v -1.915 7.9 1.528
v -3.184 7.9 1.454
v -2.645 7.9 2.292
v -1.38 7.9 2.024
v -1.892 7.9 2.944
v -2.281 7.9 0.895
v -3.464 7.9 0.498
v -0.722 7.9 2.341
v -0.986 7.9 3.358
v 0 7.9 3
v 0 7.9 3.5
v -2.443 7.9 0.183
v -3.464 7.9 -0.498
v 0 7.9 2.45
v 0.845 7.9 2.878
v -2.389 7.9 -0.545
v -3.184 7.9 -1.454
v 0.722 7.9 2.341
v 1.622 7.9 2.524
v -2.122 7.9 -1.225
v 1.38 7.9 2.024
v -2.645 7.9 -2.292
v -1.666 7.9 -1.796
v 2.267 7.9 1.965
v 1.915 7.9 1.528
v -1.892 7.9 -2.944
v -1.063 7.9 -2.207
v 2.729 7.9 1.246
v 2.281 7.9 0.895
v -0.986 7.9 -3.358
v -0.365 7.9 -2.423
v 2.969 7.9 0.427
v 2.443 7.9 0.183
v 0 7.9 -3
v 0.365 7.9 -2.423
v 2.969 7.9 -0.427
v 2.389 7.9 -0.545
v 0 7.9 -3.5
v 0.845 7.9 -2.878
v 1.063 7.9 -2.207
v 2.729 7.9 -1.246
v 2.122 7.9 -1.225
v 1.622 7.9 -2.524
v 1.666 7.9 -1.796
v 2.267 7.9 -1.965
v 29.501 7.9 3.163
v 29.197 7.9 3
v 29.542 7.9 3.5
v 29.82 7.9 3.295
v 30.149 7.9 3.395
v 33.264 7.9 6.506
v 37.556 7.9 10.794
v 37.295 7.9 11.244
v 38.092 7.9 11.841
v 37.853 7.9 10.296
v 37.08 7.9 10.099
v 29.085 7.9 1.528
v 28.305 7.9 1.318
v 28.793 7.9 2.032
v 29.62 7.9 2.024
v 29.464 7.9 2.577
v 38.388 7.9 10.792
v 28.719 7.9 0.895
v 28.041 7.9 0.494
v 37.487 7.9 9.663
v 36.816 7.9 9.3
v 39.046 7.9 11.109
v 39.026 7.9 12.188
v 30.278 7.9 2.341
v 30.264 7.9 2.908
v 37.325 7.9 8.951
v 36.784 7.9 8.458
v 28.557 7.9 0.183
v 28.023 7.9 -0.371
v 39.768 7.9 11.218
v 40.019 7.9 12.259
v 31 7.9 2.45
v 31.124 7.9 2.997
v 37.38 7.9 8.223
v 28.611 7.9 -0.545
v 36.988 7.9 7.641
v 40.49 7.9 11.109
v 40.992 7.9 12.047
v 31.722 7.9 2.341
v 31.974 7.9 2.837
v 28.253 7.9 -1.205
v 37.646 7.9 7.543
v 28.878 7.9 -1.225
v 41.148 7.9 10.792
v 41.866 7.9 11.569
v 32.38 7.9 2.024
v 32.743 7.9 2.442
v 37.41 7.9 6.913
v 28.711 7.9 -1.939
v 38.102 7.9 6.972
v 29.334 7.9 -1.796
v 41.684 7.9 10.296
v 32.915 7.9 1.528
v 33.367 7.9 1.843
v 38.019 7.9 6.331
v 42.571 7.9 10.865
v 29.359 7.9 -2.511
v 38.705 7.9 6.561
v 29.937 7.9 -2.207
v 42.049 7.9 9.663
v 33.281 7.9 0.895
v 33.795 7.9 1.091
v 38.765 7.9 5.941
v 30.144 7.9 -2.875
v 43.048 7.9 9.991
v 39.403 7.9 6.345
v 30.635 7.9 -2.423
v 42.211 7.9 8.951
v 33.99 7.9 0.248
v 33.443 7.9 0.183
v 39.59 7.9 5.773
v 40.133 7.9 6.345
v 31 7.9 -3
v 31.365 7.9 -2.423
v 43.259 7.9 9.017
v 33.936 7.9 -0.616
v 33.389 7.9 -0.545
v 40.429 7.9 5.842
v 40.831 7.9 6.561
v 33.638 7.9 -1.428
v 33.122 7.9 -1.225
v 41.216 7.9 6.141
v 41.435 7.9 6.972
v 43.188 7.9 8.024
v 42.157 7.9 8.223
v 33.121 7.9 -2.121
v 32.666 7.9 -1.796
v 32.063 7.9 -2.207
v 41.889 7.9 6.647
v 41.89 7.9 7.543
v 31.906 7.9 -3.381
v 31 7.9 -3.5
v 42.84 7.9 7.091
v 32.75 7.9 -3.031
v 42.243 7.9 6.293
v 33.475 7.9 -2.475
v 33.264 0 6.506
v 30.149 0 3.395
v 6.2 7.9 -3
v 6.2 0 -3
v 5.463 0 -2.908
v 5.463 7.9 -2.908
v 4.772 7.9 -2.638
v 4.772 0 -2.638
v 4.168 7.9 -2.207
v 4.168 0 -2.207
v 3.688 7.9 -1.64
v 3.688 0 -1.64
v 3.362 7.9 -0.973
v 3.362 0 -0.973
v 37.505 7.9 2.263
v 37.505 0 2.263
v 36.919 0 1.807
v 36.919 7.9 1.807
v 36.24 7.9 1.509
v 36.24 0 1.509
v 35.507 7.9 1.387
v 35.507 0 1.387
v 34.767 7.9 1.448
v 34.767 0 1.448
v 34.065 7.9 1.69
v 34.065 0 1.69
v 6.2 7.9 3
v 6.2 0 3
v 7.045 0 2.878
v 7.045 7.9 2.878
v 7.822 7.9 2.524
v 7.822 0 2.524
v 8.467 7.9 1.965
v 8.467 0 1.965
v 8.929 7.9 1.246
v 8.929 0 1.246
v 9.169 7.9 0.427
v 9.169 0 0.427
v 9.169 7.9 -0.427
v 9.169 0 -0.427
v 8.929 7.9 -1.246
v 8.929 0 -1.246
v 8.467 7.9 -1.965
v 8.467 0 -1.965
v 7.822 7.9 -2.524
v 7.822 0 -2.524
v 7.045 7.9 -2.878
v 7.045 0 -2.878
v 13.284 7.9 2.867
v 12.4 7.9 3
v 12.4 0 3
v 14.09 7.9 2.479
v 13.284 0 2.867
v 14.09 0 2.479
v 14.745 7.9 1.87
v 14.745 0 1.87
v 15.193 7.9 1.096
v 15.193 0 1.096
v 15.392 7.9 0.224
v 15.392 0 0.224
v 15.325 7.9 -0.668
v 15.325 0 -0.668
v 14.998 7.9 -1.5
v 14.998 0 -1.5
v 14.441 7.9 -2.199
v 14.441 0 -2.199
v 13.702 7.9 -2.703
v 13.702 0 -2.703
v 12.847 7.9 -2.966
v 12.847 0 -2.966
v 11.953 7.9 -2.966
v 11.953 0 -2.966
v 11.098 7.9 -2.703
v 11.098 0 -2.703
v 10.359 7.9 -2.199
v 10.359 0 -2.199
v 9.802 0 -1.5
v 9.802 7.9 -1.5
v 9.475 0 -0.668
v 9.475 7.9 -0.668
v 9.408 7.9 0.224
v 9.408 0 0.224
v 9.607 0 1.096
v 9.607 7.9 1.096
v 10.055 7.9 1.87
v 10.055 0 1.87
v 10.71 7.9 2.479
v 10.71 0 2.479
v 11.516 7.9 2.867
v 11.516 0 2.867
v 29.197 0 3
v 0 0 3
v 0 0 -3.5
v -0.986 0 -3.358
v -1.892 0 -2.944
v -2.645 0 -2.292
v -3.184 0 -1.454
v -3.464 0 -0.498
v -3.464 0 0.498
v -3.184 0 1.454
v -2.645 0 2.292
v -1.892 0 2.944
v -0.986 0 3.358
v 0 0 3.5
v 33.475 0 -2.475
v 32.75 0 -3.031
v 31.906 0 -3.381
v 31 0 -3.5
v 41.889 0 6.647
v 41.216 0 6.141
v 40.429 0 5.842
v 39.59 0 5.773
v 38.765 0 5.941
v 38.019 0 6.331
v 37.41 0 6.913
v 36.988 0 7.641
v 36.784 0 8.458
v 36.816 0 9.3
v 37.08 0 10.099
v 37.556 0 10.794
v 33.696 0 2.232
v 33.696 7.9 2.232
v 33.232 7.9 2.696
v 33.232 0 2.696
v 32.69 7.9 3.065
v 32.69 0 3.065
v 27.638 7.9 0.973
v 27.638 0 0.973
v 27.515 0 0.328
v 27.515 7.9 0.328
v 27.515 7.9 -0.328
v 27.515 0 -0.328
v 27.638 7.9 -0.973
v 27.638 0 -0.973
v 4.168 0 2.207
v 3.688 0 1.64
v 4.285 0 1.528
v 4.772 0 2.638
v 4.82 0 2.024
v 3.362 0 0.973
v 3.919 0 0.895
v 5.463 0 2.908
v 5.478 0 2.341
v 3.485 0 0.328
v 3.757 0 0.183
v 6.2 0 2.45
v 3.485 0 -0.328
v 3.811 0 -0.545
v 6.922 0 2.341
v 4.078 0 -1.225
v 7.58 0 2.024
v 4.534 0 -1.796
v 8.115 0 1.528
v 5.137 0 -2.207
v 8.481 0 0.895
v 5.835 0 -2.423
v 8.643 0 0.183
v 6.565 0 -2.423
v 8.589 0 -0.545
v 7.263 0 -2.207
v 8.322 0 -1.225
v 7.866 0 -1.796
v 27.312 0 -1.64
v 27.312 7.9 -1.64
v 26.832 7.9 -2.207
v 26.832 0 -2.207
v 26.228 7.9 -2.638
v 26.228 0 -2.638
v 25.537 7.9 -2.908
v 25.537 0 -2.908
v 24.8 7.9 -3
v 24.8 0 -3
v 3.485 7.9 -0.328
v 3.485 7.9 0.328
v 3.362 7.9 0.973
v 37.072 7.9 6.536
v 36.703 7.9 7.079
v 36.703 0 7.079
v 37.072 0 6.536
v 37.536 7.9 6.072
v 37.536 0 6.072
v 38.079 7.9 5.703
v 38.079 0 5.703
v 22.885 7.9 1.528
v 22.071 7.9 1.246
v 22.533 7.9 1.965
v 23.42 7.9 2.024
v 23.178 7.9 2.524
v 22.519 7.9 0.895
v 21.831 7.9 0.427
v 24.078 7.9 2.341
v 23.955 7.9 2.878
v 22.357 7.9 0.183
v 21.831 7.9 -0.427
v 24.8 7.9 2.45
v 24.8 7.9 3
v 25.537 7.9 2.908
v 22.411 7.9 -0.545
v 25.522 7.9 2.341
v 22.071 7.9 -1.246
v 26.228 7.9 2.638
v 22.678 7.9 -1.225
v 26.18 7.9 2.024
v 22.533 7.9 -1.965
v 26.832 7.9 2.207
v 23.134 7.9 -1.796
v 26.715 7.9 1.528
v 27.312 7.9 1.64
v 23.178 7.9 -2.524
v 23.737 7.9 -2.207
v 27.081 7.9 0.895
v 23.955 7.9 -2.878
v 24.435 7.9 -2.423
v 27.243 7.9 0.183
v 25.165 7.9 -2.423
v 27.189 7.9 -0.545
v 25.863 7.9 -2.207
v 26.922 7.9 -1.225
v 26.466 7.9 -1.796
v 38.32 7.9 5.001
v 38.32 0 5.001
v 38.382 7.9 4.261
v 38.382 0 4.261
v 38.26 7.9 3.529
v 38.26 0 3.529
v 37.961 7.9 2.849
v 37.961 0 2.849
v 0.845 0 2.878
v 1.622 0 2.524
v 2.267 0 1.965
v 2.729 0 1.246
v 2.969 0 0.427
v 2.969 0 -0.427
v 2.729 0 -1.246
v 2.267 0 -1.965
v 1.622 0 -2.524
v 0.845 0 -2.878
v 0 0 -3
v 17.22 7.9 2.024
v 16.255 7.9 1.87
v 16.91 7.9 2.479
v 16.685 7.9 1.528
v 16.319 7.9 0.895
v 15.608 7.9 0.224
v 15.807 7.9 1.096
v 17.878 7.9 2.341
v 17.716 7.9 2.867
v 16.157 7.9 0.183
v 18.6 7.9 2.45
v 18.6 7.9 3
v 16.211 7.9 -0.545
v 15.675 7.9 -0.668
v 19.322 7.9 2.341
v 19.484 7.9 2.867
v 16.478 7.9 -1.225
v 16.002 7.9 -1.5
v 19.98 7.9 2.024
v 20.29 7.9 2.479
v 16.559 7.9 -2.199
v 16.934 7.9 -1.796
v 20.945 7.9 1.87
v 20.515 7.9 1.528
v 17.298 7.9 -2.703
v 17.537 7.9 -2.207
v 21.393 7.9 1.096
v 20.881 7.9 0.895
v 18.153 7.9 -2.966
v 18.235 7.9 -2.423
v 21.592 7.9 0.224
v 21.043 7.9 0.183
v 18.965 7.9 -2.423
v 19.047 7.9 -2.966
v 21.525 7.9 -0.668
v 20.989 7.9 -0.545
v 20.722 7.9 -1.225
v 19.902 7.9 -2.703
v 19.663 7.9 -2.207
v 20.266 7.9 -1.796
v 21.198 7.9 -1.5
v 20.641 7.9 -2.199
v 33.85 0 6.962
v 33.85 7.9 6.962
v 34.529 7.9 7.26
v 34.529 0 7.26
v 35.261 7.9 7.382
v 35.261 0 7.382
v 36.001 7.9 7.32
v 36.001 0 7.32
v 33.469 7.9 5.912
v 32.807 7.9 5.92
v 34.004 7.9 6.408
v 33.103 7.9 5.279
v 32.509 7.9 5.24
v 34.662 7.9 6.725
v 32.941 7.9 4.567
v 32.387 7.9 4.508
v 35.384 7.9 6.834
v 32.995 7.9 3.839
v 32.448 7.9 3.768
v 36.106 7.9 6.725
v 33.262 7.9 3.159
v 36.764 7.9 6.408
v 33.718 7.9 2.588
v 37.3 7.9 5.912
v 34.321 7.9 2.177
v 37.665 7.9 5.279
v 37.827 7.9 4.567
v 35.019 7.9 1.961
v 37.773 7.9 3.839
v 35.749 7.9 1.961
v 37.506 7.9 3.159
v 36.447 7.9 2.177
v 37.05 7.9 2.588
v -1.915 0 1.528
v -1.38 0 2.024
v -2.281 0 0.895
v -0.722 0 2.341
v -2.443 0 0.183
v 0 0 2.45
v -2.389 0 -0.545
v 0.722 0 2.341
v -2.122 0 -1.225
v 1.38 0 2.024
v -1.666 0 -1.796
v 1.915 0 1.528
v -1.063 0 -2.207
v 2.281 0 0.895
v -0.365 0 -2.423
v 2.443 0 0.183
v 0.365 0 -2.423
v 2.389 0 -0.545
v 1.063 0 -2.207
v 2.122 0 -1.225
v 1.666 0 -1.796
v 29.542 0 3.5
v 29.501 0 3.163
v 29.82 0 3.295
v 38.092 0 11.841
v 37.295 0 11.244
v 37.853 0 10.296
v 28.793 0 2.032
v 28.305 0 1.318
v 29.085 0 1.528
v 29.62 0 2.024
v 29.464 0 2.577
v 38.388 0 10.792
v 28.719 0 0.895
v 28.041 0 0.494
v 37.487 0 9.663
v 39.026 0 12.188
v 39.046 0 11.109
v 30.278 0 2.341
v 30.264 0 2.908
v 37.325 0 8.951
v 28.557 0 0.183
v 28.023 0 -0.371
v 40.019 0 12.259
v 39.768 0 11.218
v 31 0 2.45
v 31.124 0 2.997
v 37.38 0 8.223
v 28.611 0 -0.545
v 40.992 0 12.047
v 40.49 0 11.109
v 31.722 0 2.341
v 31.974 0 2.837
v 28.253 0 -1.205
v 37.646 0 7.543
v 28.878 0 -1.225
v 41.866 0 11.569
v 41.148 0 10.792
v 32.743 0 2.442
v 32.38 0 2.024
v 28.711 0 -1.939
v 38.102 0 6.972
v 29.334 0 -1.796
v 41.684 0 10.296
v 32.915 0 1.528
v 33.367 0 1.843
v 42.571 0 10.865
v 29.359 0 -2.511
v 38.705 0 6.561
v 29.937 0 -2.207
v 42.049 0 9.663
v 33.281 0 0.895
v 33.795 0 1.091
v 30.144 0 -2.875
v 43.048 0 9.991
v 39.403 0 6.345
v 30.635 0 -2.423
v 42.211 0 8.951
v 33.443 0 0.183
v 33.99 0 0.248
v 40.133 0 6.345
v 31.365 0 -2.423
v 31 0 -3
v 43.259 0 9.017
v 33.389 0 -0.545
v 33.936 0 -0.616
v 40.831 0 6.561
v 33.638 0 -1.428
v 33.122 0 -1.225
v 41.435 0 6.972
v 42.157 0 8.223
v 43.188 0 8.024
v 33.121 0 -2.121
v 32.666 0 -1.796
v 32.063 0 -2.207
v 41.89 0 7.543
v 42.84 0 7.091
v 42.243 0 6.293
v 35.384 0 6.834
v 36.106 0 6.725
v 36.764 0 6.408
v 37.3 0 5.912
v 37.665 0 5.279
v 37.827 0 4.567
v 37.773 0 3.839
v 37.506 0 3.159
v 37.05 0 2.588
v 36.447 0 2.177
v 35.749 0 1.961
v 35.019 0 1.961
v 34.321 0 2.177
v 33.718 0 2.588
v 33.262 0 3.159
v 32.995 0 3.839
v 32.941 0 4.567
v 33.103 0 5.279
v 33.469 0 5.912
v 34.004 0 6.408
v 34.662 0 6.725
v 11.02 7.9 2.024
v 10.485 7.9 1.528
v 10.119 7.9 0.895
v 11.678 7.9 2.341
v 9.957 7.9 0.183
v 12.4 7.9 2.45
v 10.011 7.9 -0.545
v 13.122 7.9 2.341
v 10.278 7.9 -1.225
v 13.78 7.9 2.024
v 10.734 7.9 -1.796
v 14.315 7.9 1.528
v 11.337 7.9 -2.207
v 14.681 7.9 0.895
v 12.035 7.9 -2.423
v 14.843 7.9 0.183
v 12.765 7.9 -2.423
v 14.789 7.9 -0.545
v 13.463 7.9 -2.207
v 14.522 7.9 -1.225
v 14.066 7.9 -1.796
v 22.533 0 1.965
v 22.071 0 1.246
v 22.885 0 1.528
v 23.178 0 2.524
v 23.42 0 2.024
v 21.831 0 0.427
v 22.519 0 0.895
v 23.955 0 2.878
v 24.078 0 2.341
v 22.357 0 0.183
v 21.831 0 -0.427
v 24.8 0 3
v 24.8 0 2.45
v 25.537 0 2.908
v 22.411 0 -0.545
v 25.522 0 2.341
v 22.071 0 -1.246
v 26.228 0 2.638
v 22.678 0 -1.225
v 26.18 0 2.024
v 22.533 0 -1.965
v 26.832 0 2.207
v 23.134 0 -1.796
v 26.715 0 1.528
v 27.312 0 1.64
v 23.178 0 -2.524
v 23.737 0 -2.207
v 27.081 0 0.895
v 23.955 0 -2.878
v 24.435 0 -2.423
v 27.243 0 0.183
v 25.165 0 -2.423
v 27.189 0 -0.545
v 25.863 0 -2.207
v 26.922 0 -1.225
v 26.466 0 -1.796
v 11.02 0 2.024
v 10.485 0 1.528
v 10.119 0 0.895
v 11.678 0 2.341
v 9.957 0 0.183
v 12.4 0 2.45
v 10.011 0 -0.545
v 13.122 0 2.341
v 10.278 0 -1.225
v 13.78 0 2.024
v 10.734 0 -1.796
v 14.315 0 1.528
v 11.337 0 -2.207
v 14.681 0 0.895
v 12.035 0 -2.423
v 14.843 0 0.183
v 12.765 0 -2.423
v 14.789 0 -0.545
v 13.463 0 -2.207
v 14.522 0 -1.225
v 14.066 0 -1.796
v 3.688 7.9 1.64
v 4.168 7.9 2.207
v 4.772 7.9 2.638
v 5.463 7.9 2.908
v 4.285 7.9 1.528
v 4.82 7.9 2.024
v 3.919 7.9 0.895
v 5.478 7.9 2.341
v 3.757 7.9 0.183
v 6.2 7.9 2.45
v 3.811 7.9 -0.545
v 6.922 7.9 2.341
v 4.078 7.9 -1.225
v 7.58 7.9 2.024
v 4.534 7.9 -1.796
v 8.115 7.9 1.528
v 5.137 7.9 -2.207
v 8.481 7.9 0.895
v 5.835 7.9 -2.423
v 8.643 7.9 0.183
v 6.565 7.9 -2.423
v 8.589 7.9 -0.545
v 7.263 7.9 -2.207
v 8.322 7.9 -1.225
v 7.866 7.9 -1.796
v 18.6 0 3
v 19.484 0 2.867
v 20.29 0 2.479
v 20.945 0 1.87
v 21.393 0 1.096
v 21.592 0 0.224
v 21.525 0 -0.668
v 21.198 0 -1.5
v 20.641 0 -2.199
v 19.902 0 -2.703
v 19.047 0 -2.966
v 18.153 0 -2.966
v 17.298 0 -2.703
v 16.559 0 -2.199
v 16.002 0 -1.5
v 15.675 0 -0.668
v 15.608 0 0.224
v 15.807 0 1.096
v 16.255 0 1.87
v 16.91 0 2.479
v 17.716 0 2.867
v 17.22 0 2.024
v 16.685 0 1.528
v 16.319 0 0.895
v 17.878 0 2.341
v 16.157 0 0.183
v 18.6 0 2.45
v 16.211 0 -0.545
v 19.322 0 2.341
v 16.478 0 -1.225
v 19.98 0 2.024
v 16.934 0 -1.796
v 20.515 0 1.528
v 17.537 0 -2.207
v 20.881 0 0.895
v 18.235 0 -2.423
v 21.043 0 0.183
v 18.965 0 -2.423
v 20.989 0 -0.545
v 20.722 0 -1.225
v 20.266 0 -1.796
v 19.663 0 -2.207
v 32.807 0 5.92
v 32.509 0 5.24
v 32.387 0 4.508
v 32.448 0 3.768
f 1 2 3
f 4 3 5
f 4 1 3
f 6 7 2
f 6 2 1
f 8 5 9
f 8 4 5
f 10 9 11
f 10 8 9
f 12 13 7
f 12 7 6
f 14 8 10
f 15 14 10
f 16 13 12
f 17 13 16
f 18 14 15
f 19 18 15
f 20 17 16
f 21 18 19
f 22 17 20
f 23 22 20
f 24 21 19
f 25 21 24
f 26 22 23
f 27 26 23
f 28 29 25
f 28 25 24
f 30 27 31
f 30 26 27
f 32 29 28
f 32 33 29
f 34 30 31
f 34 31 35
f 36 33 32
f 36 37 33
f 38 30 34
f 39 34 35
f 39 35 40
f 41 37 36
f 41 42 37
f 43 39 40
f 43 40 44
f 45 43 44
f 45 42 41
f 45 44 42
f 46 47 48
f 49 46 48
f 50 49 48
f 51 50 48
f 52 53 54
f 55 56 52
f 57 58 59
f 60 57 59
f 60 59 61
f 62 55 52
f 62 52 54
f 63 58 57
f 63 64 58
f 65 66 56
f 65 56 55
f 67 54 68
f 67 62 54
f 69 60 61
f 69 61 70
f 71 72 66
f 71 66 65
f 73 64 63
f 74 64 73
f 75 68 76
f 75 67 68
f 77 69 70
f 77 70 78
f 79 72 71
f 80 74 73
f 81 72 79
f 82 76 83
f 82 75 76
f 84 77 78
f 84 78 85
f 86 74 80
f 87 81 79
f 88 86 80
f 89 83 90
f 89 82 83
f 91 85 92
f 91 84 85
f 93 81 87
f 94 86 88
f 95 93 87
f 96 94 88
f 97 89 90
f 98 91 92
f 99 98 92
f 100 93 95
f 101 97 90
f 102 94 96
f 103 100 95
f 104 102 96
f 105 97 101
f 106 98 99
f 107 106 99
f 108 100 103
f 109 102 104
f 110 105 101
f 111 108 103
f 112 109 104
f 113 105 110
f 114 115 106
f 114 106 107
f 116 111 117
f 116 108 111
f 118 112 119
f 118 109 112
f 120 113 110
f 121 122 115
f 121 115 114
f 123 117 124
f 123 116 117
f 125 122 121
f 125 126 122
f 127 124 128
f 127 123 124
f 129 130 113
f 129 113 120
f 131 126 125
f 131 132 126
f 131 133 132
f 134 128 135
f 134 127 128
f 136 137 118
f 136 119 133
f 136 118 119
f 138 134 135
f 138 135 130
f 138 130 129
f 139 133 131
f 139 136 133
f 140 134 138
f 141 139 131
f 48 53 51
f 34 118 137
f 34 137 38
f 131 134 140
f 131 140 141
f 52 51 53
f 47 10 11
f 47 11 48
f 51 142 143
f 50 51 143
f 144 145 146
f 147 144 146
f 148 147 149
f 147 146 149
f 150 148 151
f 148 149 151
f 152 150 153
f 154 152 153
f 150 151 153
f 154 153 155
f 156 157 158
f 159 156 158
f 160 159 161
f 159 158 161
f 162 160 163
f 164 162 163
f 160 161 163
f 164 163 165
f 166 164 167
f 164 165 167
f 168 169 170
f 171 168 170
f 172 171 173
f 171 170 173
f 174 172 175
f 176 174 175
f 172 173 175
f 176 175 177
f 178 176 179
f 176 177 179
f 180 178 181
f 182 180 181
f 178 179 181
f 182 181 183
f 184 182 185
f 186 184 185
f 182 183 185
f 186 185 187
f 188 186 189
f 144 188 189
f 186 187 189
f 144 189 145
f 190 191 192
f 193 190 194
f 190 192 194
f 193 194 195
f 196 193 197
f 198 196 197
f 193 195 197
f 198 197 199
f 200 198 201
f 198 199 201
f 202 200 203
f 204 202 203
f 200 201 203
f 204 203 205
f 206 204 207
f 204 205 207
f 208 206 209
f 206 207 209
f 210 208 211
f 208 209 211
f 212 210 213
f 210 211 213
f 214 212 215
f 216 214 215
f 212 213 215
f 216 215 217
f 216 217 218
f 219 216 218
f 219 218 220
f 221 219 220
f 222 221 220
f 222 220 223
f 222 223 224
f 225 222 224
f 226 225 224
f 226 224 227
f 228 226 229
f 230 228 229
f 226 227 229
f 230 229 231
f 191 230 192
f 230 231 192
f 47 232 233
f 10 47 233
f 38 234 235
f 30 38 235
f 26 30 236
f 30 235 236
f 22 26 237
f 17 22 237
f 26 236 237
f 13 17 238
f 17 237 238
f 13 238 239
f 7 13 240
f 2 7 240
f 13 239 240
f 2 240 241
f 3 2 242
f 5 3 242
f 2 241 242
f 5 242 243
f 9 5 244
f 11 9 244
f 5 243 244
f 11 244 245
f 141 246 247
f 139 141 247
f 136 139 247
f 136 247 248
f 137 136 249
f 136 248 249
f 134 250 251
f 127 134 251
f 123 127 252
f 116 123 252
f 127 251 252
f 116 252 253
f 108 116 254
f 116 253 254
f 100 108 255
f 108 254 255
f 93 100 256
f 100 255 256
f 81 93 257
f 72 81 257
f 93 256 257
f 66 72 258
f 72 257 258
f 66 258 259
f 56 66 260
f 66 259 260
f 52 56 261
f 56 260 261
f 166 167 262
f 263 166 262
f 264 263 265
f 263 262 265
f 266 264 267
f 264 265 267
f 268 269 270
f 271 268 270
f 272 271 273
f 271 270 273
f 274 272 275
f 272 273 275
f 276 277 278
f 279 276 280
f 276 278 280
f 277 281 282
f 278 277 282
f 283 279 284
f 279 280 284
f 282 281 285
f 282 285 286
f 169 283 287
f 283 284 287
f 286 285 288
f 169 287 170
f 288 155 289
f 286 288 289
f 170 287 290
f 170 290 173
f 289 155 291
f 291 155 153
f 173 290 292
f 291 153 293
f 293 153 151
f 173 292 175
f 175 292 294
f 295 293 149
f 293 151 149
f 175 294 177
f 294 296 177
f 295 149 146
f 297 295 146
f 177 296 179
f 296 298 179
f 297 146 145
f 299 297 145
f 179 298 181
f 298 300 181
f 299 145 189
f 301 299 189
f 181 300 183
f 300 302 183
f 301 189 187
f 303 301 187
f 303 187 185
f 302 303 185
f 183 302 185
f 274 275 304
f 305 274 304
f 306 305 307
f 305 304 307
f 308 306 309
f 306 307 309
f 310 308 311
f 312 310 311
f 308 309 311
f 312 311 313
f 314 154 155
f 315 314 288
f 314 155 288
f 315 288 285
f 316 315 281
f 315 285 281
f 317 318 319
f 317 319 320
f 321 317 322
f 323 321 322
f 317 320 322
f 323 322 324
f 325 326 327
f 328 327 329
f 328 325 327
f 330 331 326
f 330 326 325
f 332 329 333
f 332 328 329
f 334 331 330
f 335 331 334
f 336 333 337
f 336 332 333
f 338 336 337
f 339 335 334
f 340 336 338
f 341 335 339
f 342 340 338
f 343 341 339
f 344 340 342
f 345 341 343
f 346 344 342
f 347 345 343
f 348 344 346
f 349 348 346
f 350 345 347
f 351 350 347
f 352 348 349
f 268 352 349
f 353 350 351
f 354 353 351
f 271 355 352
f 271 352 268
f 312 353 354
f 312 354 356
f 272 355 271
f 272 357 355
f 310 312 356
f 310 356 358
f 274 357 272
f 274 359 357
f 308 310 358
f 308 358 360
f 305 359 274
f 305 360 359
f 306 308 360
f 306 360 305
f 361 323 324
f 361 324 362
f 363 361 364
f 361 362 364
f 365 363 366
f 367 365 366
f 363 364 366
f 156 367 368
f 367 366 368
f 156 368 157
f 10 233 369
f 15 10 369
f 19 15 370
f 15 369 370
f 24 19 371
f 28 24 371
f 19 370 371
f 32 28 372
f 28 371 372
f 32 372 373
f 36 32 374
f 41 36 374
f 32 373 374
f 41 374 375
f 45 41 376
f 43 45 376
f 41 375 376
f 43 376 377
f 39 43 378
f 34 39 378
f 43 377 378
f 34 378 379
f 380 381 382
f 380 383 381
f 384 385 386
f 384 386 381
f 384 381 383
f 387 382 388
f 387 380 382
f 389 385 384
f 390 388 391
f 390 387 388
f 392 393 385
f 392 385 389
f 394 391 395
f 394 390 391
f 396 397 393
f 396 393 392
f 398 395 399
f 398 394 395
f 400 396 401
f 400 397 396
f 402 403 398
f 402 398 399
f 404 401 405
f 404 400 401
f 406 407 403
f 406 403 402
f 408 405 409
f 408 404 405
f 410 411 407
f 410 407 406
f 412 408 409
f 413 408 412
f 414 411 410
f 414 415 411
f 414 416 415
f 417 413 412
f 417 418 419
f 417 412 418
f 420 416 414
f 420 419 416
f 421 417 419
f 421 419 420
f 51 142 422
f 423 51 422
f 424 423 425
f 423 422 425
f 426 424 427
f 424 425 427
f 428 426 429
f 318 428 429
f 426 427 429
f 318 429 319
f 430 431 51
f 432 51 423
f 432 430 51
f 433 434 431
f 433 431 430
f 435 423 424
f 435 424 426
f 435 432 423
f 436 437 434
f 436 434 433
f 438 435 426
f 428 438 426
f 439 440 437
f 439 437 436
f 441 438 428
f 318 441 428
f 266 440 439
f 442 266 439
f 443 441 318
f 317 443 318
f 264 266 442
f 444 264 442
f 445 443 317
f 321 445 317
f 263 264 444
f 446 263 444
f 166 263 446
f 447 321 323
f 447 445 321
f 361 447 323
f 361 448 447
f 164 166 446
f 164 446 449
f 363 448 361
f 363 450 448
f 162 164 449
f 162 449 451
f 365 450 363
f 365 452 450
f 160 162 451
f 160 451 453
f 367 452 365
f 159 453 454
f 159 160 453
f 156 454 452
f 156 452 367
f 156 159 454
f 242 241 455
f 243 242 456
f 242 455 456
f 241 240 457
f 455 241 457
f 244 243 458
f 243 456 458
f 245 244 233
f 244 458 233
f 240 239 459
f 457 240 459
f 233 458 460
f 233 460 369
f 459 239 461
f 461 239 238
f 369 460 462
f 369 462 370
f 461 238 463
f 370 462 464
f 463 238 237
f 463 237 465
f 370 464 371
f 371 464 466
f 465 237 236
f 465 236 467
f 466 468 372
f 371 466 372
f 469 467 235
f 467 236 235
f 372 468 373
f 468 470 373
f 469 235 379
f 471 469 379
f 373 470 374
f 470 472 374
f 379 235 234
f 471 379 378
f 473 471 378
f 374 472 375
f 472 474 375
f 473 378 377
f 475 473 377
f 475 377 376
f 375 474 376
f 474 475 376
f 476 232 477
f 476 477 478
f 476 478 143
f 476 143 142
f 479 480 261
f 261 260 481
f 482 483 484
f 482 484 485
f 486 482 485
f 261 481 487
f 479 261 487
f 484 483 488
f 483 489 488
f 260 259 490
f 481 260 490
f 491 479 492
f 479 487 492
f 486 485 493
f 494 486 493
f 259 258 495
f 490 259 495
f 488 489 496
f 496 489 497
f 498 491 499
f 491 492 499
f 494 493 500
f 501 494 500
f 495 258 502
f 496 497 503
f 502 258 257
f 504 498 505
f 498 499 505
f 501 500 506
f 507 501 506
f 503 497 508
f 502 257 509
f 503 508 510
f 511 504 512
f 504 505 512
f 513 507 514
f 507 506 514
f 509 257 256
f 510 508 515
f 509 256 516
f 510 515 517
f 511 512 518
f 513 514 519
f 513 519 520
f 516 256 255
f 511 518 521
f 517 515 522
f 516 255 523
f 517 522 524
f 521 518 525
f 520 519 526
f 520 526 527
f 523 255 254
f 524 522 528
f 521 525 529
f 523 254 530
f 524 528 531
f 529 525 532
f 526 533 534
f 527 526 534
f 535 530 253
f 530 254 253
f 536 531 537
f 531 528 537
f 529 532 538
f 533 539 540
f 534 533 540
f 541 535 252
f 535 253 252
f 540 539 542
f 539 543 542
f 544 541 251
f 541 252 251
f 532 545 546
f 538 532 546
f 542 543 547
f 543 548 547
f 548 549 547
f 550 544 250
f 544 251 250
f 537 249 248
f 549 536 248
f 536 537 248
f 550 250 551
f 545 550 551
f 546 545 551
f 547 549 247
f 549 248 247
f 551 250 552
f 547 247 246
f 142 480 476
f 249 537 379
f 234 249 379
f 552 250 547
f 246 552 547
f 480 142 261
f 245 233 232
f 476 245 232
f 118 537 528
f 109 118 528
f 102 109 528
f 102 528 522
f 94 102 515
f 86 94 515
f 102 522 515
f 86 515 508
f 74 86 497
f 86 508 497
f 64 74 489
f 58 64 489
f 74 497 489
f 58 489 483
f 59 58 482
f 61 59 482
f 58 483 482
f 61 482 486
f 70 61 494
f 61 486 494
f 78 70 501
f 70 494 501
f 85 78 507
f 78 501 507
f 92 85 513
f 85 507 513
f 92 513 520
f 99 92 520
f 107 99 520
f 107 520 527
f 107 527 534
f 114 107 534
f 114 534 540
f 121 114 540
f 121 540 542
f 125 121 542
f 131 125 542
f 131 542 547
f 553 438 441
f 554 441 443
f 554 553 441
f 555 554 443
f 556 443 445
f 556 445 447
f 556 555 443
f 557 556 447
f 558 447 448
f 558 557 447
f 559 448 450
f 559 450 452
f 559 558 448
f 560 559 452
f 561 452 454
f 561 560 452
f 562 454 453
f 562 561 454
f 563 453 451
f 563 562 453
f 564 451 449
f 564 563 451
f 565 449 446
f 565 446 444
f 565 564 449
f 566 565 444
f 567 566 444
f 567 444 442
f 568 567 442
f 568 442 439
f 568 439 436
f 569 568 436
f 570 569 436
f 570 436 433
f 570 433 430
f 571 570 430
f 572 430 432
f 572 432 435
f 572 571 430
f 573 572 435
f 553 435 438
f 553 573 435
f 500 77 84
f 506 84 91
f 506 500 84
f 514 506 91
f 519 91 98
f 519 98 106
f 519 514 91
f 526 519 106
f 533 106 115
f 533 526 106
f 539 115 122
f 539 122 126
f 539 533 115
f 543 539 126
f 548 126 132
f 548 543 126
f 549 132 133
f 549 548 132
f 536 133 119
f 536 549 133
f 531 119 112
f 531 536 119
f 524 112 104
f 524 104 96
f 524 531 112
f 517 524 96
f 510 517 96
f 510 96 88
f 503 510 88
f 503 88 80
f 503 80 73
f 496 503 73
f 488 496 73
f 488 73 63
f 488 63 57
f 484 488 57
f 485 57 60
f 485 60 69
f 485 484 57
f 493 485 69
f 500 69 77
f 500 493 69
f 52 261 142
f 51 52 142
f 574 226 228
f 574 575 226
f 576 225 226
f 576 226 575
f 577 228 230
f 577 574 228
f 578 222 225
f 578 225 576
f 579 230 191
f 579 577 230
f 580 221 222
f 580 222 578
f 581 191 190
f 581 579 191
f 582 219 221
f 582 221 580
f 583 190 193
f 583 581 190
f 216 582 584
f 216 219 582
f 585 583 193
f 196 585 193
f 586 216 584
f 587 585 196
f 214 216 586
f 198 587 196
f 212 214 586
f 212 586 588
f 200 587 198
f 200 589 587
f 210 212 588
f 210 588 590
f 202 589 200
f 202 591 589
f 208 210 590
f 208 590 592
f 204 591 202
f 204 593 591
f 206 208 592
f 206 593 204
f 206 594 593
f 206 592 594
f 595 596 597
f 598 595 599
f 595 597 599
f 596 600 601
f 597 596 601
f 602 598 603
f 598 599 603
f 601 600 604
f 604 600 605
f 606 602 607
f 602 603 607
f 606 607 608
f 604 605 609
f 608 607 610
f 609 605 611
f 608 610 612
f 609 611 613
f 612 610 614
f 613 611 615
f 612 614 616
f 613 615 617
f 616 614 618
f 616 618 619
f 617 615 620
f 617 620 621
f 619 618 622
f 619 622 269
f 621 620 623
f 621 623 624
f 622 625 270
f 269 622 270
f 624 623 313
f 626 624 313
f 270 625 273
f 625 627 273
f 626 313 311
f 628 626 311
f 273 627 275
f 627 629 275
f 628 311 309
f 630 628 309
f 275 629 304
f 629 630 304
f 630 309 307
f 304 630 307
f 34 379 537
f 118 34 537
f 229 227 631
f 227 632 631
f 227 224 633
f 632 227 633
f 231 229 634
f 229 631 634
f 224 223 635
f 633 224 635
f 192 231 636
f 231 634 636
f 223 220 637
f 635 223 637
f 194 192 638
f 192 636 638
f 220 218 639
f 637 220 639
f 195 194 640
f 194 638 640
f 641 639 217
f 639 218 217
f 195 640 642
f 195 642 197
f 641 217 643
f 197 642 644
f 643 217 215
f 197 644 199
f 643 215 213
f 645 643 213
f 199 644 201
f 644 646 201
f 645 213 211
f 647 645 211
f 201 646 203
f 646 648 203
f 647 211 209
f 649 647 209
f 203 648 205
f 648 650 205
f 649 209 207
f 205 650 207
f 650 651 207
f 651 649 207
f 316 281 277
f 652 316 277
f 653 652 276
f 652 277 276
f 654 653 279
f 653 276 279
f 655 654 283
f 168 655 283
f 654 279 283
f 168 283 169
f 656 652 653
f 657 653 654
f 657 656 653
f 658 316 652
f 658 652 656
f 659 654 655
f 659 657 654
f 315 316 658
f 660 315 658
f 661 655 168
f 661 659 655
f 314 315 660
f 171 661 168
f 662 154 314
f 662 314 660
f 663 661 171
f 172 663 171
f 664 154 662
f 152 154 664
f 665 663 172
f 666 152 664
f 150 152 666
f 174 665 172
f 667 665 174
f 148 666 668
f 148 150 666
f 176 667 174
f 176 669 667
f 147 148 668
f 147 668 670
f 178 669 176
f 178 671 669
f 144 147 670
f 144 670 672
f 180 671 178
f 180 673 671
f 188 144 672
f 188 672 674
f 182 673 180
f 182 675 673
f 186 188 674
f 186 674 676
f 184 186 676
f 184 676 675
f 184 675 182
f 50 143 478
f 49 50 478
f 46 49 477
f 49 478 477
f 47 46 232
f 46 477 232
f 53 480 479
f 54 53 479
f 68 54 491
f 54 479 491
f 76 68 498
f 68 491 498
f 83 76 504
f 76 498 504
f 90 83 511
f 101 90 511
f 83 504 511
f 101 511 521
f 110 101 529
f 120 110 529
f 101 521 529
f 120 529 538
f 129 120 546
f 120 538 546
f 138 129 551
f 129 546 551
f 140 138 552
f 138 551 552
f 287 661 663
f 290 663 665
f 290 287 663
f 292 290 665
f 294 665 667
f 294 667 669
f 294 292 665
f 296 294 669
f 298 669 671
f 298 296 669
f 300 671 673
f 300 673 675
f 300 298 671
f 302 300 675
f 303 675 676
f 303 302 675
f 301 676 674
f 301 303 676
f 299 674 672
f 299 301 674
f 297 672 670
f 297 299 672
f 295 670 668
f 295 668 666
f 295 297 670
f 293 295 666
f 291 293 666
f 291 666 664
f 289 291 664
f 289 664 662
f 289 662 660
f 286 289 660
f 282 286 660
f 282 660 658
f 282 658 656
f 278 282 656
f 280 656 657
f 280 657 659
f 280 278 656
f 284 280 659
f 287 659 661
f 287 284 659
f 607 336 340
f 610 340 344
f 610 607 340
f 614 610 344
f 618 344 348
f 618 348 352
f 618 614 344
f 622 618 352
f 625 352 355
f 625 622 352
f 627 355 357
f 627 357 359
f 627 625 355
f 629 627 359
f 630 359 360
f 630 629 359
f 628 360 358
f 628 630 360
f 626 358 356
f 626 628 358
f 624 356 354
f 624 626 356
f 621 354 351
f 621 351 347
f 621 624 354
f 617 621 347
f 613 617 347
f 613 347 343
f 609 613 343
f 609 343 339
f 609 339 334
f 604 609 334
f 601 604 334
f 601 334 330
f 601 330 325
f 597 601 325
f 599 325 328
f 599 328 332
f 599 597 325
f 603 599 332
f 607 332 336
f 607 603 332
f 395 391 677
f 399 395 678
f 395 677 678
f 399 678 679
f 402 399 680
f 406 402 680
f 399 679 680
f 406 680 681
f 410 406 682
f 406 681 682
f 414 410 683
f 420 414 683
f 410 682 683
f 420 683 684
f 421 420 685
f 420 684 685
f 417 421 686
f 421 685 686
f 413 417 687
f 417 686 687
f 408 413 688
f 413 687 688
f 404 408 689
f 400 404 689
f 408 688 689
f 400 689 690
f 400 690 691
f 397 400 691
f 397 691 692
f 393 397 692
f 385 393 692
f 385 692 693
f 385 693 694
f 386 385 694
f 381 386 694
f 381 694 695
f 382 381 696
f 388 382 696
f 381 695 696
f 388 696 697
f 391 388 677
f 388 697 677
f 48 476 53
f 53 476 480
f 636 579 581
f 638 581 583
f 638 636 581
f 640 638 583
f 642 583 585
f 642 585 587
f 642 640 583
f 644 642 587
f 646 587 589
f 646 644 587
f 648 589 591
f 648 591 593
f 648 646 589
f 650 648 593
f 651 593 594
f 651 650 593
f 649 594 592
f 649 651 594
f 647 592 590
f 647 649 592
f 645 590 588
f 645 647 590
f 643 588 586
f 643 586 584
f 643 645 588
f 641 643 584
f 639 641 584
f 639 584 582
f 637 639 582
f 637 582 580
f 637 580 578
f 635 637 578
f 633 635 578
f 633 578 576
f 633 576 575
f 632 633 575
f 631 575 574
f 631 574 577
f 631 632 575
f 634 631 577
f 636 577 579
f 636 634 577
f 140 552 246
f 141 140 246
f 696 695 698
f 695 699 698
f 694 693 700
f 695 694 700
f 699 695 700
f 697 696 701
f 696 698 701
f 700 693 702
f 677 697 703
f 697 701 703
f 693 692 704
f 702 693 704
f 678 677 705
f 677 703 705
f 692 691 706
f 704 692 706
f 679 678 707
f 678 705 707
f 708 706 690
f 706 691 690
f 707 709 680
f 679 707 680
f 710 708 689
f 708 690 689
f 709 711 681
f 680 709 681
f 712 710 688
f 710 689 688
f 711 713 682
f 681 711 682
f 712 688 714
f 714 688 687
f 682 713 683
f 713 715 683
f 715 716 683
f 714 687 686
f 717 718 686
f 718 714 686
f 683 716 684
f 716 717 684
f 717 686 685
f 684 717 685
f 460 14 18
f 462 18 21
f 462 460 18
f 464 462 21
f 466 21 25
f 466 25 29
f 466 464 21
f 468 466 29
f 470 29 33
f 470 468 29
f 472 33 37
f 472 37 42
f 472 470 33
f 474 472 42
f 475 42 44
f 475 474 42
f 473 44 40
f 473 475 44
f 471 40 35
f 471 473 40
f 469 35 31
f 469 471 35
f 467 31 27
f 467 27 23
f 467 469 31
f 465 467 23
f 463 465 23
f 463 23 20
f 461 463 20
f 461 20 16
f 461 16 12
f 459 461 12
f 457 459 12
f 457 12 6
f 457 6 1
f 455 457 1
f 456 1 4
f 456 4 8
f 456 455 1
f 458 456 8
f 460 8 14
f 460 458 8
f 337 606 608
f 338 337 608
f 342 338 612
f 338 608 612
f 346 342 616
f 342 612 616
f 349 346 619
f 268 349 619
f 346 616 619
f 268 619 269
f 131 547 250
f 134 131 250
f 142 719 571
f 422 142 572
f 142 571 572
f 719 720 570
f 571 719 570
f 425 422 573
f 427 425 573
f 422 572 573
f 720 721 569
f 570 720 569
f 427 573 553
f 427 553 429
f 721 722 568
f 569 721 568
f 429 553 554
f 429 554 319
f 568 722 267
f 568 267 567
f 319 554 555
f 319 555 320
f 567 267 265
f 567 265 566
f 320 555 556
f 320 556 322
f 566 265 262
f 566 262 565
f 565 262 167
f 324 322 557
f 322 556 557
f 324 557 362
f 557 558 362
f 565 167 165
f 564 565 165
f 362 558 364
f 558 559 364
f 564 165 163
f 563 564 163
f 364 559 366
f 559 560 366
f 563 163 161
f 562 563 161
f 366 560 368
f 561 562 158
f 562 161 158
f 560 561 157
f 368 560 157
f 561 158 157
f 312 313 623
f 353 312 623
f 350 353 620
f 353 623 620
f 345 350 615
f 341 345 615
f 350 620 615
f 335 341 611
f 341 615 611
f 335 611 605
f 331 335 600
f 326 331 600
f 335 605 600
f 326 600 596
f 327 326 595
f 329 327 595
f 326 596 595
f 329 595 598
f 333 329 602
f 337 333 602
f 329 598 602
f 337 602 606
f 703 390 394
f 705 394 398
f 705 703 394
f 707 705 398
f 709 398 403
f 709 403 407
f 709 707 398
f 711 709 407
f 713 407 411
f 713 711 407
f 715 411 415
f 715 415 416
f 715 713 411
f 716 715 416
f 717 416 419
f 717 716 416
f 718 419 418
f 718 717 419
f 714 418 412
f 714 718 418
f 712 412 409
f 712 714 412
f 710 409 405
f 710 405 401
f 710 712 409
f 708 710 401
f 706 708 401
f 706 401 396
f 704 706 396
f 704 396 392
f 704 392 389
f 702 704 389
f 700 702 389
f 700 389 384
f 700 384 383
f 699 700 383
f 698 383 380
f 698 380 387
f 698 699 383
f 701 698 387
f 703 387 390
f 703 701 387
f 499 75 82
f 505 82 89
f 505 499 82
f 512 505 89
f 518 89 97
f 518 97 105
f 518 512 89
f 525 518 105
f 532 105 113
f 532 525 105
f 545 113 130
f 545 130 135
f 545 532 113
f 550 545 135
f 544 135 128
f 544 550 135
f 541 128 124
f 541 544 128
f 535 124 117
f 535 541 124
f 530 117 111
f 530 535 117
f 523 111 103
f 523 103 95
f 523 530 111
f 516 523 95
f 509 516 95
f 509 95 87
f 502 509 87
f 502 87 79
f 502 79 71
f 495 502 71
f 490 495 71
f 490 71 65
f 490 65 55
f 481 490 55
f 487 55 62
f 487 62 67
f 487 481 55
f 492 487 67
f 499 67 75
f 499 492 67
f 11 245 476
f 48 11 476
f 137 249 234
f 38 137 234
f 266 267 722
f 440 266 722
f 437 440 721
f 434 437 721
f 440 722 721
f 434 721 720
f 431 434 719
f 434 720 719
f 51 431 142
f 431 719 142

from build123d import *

# Parameters (mm, degrees)
SKETCH1_R             = 2.45
BOSS_EXTRUDE1_DEPTH   = 7.9
BOSS_EXTRUDE1_2_DEPTH = 7.9
BOSS_EXTRUDE1_3_DEPTH = 7.9
BOSS_EXTRUDE1_4_DEPTH = 7.9
BOSS_EXTRUDE1_5_DEPTH = 7.9
BOSS_EXTRUDE1_6_DEPTH = 7.9


with BuildPart() as part:
    # Sketch1 → Boss-Extrude1 (new body)
    with BuildSketch(Plane(origin=(0, 0, 0), x_dir=(1, 0, 0), z_dir=(0, 1, 0))):
        with BuildLine():
            ThreePointArc((3.362096774, 0.972782237), (3.5, 0), (3.362096774, -0.972782237))
            ThreePointArc((3.362096774, -0.972782237), (4.456203382, -2.441141814), (6.2, -3))
            ThreePointArc((6.2, -3), (9.2, 0), (6.2, 3))
            ThreePointArc((6.2, 3), (4.456203382, 2.441141814), (3.362096774, 0.972782237))
        make_face()
        with Locations(Location((6.2, 0, 0), (0, 0, 270))):
            Circle(SKETCH1_R, mode=Mode.SUBTRACT)
    extrude(amount=BOSS_EXTRUDE1_DEPTH)


with BuildPart() as body_2:
    # Sketch1 → Boss-Extrude1 2 (new body)
    with BuildSketch(Plane(origin=(0, 0, 0), x_dir=(1, 0, 0), z_dir=(0, 1, 0))):
        with BuildLine():
            ThreePointArc((12.4, 3), (9.4, 0), (12.4, -3))
            ThreePointArc((12.4, -3), (15.4, 0), (12.4, 3))
        make_face()
        with Locations(Location((12.4, 0, 0), (0, 0, 270))):
            Circle(SKETCH1_R, mode=Mode.SUBTRACT)
    extrude(amount=BOSS_EXTRUDE1_2_DEPTH)


with BuildPart() as body_3:
    # Sketch1 → Boss-Extrude1 3 (new body)
    with BuildSketch(Plane(origin=(0, 0, 0), x_dir=(1, 0, 0), z_dir=(0, 1, 0))):
        with BuildLine():
            Line((42.242997821, -6.293250353), (33.474873734, 2.474873734))
            ThreePointArc((33.474873734, 2.474873734), (32.339392013, 3.233578364), (31, 3.5))
            Line((31, 3.5), (0, 3.5))
            ThreePointArc((0, 3.5), (-3.5, 0), (0, -3.5))
            Line((0, -3.5), (29.541622158, -3.5))
            Line((29.541622158, -3.5), (37.294629097, -11.244375798))
            ThreePointArc((37.294629097, -11.244375798), (42.243686905, -11.242308545), (42.242997821, -6.293250353))
        make_face()
        with Locations(Location((39.768124087, -8.768124087, 0), (0, 0, 270))):
            Circle(SKETCH1_R, mode=Mode.SUBTRACT)
        with Locations(Location((0, 0, 0), (0, 0, 270))):
            Circle(SKETCH1_R, mode=Mode.SUBTRACT)
        with BuildLine():
            Line((6.2, 3), (12.4, 3))
            Line((12.4, 3), (18.6, 3))
            Line((18.6, 3), (24.8, 3))
            Line((24.8, 3), (31, 3))
            ThreePointArc((31, 3), (29.851949677, -2.771638587), (33.121320383, 2.121320304))
            Line((33.121320383, 2.121320304), (37.505382392, -2.262741705))
            Line((37.505382392, -2.262741705), (41.889445139, -6.646804452))
            ThreePointArc((41.889445139, -6.646804452), (37.693998863, -6.600636011), (37.555518704, -10.794050398))
            Line((37.555518704, -10.794050398), (33.263757463, -6.506397664))
            Line((33.263757463, -6.506397664), (30.149460625, -3.395082145))
            ThreePointArc((30.149460625, -3.395082145), (29.658716058, -3.232794052), (29.197224362, -3))
            Line((29.197224362, -3), (24.8, -3))
            Line((24.8, -3), (18.6, -3))
            Line((18.6, -3), (12.4, -3))
            Line((12.4, -3), (6.2, -3))
            Line((6.2, -3), (0, -3))
            ThreePointArc((0, -3), (3, 0), (0, 3))
            Line((0, 3), (6.2, 3))
        make_face(mode=Mode.SUBTRACT)
        with Locations(Location((31, 0, 0), (0, 0, 270))):
            Circle(SKETCH1_R, mode=Mode.SUBTRACT)
    extrude(amount=BOSS_EXTRUDE1_3_DEPTH)


with BuildPart() as body_4:
    # Sketch1 → Boss-Extrude1 4 (new body)
    with BuildSketch(Plane(origin=(0, 0, 0), x_dir=(1, 0, 0), z_dir=(0, 1, 0))):
        with BuildLine():
            ThreePointArc((18.6, 3), (15.6, 0), (18.6, -3))
            ThreePointArc((18.6, -3), (21.6, 0), (18.6, 3))
        make_face()
        with Locations(Location((18.6, 0, 0), (0, 0, 270))):
            Circle(SKETCH1_R, mode=Mode.SUBTRACT)
    extrude(amount=BOSS_EXTRUDE1_4_DEPTH)


with BuildPart() as body_5:
    # Sketch1 → Boss-Extrude1 5 (new body)
    with BuildSketch(Plane(origin=(0, 0, 0), x_dir=(1, 0, 0), z_dir=(0, 1, 0))):
        with BuildLine():
            ThreePointArc((27.637903226, 0.972782237), (26.543796618, 2.441141814), (24.8, 3))
            ThreePointArc((24.8, 3), (21.8, 0), (24.8, -3))
            ThreePointArc((24.8, -3), (26.543796618, -2.441141814), (27.637903226, -0.972782237))
            ThreePointArc((27.637903226, -0.972782237), (27.5, 0), (27.637903226, 0.972782237))
        make_face()
        with Locations(Location((24.8, 0, 0), (0, 0, 270))):
            Circle(SKETCH1_R, mode=Mode.SUBTRACT)
    extrude(amount=BOSS_EXTRUDE1_5_DEPTH)


with BuildPart() as body_6:
    # Sketch1 → Boss-Extrude1 6 (new body)
    with BuildSketch(Plane(origin=(0, 0, 0), x_dir=(1, 0, 0), z_dir=(0, 1, 0))):
        with BuildLine():
            ThreePointArc((32.689500512, -3.065222345), (32.424981812, -4.877867861), (33.263757463, -6.506397664))
            ThreePointArc((33.263757463, -6.506397664), (34.891672855, -7.34337833), (36.702901742, -7.078623575))
            ThreePointArc((36.702901742, -7.078623575), (37.293250353, -6.293250353), (38.078623575, -5.702901742))
            ThreePointArc((38.078623575, -5.702901742), (38.343260388, -3.89096453), (37.505382392, -2.262741705))
            ThreePointArc((37.505382392, -2.262741705), (35.877159564, -1.4248637), (34.065222345, -1.689500512))
            ThreePointArc((34.065222345, -1.689500512), (33.474873734, -2.474873734), (32.689500512, -3.065222345))
        make_face()
        with Locations(Location((35.384062043, -4.384062043, 0), (0, 0, 270))):
            Circle(SKETCH1_R, mode=Mode.SUBTRACT)
    extrude(amount=BOSS_EXTRUDE1_6_DEPTH)


solid = Compound([part.part, body_2.part, body_3.part, body_4.part, body_5.part, body_6.part])
